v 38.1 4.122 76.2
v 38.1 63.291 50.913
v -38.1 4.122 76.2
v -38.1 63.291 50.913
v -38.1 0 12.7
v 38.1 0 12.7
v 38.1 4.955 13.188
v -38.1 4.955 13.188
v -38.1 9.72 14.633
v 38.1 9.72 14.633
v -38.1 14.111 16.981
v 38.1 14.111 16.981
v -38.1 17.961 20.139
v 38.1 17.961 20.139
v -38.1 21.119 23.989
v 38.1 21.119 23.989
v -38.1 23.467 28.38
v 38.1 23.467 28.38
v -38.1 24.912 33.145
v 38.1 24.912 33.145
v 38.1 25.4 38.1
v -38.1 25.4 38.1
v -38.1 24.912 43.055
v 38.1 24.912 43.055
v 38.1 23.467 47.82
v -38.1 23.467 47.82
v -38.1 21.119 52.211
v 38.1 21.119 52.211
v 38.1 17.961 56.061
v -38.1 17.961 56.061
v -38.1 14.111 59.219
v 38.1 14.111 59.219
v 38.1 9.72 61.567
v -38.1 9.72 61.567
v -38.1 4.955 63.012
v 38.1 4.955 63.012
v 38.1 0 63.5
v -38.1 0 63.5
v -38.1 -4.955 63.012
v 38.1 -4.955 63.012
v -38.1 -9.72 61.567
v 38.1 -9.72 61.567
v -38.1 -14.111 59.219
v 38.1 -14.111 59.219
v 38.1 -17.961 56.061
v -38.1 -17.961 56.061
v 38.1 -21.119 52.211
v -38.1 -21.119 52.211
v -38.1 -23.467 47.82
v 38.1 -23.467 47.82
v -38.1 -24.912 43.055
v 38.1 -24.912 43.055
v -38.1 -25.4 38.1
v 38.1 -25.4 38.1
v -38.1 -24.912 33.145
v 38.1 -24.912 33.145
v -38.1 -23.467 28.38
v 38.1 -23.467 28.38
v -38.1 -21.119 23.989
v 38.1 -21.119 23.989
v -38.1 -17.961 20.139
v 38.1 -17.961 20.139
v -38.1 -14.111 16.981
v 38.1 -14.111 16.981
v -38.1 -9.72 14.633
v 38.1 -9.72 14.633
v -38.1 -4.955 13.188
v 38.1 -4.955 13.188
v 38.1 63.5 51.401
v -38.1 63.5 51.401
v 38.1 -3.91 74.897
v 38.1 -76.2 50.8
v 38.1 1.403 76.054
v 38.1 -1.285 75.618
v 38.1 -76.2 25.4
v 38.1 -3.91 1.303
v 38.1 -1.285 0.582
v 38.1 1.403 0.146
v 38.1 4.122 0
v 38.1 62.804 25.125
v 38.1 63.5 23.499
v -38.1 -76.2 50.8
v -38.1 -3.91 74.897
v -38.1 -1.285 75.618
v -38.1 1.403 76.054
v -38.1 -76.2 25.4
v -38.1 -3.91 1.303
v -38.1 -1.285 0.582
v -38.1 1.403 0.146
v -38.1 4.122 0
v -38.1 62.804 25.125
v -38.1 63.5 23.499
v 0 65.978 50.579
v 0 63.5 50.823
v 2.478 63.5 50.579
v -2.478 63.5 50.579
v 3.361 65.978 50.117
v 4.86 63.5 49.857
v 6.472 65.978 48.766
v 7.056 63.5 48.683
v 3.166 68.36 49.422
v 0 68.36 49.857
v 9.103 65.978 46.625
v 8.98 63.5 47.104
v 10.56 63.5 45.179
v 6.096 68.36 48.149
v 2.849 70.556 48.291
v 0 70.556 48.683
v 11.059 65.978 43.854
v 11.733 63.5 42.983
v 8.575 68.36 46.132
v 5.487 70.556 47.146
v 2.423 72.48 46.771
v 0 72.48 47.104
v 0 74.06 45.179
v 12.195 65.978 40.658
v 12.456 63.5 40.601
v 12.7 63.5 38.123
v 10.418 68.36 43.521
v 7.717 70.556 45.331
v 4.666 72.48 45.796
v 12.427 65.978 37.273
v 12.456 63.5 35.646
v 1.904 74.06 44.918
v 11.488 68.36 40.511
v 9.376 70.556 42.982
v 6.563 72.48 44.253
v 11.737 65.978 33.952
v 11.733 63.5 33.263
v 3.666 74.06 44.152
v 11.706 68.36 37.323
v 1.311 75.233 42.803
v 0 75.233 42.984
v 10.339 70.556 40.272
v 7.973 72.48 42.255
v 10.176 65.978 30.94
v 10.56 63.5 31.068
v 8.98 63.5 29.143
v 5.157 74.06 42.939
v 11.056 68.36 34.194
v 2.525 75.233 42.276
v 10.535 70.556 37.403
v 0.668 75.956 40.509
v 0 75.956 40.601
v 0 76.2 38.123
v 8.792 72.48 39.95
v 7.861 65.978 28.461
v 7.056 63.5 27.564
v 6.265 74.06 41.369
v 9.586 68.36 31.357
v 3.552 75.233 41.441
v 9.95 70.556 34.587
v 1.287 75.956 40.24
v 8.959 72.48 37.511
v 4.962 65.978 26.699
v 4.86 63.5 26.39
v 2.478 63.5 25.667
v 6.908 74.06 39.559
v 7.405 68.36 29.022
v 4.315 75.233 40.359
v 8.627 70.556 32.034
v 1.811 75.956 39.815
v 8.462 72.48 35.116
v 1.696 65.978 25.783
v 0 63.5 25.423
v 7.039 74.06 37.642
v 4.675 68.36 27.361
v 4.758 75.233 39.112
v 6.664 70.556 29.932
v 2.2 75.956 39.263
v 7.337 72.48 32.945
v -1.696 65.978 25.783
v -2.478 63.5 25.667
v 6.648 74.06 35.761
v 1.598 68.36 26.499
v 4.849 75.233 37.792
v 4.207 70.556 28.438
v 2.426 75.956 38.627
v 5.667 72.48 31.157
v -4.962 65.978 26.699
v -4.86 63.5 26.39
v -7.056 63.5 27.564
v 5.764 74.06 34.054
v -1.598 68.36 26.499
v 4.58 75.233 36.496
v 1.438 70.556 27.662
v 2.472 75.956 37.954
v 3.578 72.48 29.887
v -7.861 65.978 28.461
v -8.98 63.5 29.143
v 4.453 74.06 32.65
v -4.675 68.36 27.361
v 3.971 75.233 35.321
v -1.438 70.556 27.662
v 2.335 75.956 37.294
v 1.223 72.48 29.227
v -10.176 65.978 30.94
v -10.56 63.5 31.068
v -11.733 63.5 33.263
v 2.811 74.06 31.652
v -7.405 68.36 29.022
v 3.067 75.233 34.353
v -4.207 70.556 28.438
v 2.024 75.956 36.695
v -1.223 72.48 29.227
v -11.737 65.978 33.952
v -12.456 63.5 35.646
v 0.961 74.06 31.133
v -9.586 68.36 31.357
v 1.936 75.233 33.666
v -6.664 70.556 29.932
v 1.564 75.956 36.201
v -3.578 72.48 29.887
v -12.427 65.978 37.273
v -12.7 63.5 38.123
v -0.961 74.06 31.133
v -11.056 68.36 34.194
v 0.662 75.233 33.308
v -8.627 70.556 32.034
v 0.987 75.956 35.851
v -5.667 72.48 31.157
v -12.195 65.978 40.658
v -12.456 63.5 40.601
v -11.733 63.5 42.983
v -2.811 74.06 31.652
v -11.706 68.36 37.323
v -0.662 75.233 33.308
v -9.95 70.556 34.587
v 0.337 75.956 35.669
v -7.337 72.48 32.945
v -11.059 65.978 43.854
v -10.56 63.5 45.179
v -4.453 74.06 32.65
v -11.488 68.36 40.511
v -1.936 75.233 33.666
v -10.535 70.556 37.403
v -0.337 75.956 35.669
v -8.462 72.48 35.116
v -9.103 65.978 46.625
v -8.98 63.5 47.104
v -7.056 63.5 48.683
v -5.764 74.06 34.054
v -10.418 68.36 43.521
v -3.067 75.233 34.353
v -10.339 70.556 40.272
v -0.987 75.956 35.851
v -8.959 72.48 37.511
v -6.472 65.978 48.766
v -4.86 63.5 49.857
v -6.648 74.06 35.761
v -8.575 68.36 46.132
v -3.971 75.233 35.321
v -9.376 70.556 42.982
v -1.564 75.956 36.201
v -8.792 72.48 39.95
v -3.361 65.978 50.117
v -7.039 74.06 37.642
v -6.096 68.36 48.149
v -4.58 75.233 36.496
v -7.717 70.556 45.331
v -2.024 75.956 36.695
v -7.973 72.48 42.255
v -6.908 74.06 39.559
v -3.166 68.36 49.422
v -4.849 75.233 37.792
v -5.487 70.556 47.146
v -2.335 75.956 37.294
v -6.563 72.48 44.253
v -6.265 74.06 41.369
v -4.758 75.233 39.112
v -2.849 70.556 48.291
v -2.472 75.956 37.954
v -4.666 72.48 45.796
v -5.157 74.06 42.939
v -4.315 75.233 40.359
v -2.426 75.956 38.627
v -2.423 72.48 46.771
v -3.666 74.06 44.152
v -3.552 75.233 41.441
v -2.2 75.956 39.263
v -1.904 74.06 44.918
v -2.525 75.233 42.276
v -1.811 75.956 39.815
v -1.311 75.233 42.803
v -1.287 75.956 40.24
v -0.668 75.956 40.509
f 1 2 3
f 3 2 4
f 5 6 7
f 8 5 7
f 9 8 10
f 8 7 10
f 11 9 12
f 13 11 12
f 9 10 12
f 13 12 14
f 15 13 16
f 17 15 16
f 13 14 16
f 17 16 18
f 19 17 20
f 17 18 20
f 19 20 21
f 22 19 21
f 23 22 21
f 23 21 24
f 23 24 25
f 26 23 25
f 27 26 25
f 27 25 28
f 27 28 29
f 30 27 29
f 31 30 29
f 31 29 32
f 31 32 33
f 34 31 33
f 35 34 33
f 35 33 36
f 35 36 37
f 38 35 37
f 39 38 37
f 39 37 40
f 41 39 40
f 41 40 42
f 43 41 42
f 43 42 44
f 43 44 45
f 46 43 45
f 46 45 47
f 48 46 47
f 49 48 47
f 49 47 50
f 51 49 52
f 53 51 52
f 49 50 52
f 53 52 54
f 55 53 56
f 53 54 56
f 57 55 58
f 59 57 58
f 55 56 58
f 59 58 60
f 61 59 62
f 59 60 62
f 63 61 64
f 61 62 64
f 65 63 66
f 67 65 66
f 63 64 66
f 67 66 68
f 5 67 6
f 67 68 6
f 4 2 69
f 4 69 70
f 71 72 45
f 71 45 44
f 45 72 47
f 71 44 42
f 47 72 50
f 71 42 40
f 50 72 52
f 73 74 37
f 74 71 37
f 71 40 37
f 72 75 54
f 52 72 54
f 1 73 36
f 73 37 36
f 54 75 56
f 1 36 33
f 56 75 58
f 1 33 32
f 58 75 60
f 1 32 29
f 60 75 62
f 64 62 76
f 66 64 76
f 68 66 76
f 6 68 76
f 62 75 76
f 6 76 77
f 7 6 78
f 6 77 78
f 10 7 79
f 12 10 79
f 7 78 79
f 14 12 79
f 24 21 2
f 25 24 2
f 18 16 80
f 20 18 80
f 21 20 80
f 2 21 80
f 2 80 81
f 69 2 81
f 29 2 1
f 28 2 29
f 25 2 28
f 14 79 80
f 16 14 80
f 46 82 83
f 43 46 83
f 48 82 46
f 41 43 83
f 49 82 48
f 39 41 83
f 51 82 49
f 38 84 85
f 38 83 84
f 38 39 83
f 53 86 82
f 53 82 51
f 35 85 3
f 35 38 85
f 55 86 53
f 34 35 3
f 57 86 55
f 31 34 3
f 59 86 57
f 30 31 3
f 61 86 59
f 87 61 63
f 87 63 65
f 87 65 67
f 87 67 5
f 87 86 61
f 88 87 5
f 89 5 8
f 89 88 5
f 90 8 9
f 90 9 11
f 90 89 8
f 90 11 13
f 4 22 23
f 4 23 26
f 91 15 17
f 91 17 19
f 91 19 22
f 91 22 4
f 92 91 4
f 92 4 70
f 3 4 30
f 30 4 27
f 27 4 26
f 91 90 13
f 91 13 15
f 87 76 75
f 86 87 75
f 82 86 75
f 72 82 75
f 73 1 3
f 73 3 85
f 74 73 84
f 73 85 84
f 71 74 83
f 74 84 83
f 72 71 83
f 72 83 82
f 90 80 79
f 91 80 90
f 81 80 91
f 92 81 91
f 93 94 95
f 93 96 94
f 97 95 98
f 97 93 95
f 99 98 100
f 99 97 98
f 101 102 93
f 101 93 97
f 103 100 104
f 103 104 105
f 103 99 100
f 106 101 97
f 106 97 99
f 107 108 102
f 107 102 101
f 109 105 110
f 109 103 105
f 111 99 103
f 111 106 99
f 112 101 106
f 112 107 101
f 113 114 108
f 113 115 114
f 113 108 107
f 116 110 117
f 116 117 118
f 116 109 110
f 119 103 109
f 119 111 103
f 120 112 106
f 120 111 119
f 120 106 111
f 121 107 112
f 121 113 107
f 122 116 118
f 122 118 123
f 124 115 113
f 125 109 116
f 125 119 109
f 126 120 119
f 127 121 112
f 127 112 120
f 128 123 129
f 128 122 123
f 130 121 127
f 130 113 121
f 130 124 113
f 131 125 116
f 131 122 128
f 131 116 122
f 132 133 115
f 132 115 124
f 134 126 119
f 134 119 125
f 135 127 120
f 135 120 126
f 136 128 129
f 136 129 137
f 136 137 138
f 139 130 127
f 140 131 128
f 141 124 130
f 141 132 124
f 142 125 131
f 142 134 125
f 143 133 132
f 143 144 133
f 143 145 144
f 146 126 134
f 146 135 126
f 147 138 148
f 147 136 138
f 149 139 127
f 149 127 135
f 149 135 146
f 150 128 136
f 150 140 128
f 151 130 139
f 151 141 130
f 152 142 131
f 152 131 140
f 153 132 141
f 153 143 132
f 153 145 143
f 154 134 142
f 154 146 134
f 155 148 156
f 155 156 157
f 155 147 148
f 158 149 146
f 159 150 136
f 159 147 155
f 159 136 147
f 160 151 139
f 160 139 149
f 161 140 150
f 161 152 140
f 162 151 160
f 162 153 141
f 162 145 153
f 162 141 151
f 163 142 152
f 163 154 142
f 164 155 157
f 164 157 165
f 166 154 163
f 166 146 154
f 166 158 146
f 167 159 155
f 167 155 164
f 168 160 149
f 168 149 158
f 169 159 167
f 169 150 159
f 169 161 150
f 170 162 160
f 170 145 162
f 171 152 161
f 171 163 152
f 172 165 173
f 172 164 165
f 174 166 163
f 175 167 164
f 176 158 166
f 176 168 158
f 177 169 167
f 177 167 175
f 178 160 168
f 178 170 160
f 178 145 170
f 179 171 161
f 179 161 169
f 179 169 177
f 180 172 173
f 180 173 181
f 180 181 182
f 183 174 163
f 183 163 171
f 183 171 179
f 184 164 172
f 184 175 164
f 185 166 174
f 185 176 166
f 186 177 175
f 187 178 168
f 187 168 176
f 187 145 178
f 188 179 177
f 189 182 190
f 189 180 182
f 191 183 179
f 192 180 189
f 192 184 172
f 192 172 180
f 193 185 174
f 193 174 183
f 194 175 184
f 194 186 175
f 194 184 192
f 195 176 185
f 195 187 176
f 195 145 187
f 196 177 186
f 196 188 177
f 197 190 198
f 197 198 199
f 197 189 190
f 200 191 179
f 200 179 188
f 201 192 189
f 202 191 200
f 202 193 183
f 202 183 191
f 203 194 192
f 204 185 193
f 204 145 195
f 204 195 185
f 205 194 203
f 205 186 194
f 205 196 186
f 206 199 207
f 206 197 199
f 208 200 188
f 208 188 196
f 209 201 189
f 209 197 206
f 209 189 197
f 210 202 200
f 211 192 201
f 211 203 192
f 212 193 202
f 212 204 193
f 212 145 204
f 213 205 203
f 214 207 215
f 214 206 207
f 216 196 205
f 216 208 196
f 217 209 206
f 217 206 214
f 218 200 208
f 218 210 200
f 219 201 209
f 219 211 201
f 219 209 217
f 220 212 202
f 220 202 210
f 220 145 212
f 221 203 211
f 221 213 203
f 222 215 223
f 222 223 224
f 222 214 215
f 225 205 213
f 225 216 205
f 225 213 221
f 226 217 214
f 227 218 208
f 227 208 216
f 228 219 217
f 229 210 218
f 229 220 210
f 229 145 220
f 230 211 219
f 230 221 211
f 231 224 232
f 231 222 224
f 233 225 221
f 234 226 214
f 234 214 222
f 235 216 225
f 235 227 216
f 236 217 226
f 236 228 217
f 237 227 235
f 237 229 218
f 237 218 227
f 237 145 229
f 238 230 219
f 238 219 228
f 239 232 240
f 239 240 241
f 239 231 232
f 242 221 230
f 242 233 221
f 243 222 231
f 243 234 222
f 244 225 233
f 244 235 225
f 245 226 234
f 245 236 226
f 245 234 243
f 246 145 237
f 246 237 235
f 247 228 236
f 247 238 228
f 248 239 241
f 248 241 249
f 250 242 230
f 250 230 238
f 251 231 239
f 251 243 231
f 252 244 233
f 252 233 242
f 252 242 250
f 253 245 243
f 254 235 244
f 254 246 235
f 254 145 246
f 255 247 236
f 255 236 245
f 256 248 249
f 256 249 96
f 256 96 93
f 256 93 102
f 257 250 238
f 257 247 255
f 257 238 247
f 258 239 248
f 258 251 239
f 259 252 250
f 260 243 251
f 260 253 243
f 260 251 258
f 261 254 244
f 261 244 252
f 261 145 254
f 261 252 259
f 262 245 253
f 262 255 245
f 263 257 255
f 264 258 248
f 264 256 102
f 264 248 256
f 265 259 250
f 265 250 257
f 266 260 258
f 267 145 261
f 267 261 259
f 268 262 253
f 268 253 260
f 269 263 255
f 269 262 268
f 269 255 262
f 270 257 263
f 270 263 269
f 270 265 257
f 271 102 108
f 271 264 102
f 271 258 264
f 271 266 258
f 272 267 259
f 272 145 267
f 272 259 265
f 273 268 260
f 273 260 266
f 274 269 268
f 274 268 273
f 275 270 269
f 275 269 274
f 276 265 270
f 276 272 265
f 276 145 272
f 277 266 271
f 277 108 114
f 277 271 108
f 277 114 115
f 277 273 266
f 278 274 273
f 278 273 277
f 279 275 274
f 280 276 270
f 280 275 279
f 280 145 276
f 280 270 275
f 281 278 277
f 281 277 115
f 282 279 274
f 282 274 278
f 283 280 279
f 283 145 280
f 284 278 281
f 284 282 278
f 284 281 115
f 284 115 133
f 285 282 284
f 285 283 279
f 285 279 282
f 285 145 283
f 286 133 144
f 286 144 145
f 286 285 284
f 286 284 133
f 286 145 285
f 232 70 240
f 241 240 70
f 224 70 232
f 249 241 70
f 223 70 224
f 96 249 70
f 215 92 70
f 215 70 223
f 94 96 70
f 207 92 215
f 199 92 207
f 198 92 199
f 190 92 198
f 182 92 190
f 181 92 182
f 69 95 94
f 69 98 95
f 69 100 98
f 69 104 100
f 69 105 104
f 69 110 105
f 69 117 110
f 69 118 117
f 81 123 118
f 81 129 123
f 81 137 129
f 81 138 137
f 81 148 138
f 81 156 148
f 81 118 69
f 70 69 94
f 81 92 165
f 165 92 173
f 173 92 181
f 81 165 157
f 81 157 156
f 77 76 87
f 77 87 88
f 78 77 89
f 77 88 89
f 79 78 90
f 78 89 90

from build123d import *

# Parameters (mm, degrees)
SKETCH1_W           = 76.2
SKETCH1_H           = 152.4
BOSS_EXTRUDE1_DEPTH = 76.2
SKETCH2_R           = 25.4
CUT_EXTRUDE1_DEPTH  = 101.6
CUT_EXTRUDE2_DEPTH  = 132.982271537
FILLET1_R           = 25.4
SKETCH4_W           = 76.2
SKETCH4_H           = 76.2
SKETCH4_R           = 12.7
CUT_EXTRUDE3_DEPTH  = 12.7
FILLET2_R           = 12.7
SKETCH6_W           = 83.912866254
SKETCH6_H           = 103.792472971
CUT_EXTRUDE4_DEPTH  = 25.4
SKETCH7_W           = 80.804571494
SKETCH7_H           = 97.595131804
CUT_EXTRUDE5_DEPTH  = 25.4


with BuildPart() as part:
    # Sketch1 → Boss-Extrude1 (new body)
    with BuildSketch(Plane.XY):
        Rectangle(SKETCH1_W, SKETCH1_H)
    extrude(amount=BOSS_EXTRUDE1_DEPTH)

    # Sketch2 → Cut-Extrude1 (cut)
    with BuildSketch(Plane(origin=(38.1, 0, 0), x_dir=(0, 0, -1), z_dir=(1, 0, 0))):
        with Locations((-38.1, 0)):
            Circle(SKETCH2_R)
    extrude(amount=-CUT_EXTRUDE1_DEPTH, mode=Mode.SUBTRACT)

    # Sketch3 → Cut-Extrude2 (cut, through all)
    with BuildSketch(Plane(origin=(38.1, 0, 0), x_dir=(0, 0, -1), z_dir=(1, 0, 0))):
        Polygon((-76.2, 0), (-50.8, -76.2), (-76.2, -76.2), align=None)
        Polygon((0, 0), (-25.4, -76.2), (0, -76.2), align=None)
    extrude(amount=-CUT_EXTRUDE2_DEPTH, mode=Mode.SUBTRACT)

    # Fillet1
    fillet1_edges = [part.edges().sort_by_distance(p)[0] for p in [
        (0, 0, 76.2),
        (0, 0, 0),
    ]]
    fillet(fillet1_edges, radius=FILLET1_R)

    # Sketch4 → Cut-Extrude3 (cut)
    with BuildSketch(Plane(origin=(0, 76.2, 0), x_dir=(1, 0, 0), z_dir=(0, 1, 0))):
        with Locations((0, -38.1)):
            Rectangle(SKETCH4_W, SKETCH4_H)
        with Locations(Location((0, -38.123369208, 0), (0, 0, 270))):
            Circle(SKETCH4_R, mode=Mode.SUBTRACT)
    extrude(amount=-CUT_EXTRUDE3_DEPTH, mode=Mode.SUBTRACT)

    # Fillet2
    fillet2_edges = [part.edges().sort_by_distance(p)[0] for p in [
        (0, 76.2, 25.423369208),
    ]]
    fillet(fillet2_edges, radius=FILLET2_R - 0.0001)  # a hair under: the kernel refuses the full size

    # Sketch6 → Cut-Extrude4 (cut)
    with BuildSketch(Plane(origin=(0, 28.172957058, 65.921201736), x_dir=(-1, 0, 0), z_dir=(0, -0.3929882709190667, -0.9195434839745439))):
        with Locations((0.104629509, -13.705043198)):
            Rectangle(SKETCH6_W, SKETCH6_H)
    extrude(amount=-CUT_EXTRUDE4_DEPTH, mode=Mode.SUBTRACT)

    # Sketch7 → Cut-Extrude5 (cut)
    with BuildSketch(Plane(origin=(0, 0.638561447, -1.491407194), x_dir=(-1, 0, 0), z_dir=(0, 0.39360002771646513, -0.9192817947624101))):
        with Locations((0.629646012, 18.826047721)):
            Rectangle(SKETCH7_W, SKETCH7_H)
    extrude(amount=CUT_EXTRUDE5_DEPTH, mode=Mode.SUBTRACT)


solid = part.part
